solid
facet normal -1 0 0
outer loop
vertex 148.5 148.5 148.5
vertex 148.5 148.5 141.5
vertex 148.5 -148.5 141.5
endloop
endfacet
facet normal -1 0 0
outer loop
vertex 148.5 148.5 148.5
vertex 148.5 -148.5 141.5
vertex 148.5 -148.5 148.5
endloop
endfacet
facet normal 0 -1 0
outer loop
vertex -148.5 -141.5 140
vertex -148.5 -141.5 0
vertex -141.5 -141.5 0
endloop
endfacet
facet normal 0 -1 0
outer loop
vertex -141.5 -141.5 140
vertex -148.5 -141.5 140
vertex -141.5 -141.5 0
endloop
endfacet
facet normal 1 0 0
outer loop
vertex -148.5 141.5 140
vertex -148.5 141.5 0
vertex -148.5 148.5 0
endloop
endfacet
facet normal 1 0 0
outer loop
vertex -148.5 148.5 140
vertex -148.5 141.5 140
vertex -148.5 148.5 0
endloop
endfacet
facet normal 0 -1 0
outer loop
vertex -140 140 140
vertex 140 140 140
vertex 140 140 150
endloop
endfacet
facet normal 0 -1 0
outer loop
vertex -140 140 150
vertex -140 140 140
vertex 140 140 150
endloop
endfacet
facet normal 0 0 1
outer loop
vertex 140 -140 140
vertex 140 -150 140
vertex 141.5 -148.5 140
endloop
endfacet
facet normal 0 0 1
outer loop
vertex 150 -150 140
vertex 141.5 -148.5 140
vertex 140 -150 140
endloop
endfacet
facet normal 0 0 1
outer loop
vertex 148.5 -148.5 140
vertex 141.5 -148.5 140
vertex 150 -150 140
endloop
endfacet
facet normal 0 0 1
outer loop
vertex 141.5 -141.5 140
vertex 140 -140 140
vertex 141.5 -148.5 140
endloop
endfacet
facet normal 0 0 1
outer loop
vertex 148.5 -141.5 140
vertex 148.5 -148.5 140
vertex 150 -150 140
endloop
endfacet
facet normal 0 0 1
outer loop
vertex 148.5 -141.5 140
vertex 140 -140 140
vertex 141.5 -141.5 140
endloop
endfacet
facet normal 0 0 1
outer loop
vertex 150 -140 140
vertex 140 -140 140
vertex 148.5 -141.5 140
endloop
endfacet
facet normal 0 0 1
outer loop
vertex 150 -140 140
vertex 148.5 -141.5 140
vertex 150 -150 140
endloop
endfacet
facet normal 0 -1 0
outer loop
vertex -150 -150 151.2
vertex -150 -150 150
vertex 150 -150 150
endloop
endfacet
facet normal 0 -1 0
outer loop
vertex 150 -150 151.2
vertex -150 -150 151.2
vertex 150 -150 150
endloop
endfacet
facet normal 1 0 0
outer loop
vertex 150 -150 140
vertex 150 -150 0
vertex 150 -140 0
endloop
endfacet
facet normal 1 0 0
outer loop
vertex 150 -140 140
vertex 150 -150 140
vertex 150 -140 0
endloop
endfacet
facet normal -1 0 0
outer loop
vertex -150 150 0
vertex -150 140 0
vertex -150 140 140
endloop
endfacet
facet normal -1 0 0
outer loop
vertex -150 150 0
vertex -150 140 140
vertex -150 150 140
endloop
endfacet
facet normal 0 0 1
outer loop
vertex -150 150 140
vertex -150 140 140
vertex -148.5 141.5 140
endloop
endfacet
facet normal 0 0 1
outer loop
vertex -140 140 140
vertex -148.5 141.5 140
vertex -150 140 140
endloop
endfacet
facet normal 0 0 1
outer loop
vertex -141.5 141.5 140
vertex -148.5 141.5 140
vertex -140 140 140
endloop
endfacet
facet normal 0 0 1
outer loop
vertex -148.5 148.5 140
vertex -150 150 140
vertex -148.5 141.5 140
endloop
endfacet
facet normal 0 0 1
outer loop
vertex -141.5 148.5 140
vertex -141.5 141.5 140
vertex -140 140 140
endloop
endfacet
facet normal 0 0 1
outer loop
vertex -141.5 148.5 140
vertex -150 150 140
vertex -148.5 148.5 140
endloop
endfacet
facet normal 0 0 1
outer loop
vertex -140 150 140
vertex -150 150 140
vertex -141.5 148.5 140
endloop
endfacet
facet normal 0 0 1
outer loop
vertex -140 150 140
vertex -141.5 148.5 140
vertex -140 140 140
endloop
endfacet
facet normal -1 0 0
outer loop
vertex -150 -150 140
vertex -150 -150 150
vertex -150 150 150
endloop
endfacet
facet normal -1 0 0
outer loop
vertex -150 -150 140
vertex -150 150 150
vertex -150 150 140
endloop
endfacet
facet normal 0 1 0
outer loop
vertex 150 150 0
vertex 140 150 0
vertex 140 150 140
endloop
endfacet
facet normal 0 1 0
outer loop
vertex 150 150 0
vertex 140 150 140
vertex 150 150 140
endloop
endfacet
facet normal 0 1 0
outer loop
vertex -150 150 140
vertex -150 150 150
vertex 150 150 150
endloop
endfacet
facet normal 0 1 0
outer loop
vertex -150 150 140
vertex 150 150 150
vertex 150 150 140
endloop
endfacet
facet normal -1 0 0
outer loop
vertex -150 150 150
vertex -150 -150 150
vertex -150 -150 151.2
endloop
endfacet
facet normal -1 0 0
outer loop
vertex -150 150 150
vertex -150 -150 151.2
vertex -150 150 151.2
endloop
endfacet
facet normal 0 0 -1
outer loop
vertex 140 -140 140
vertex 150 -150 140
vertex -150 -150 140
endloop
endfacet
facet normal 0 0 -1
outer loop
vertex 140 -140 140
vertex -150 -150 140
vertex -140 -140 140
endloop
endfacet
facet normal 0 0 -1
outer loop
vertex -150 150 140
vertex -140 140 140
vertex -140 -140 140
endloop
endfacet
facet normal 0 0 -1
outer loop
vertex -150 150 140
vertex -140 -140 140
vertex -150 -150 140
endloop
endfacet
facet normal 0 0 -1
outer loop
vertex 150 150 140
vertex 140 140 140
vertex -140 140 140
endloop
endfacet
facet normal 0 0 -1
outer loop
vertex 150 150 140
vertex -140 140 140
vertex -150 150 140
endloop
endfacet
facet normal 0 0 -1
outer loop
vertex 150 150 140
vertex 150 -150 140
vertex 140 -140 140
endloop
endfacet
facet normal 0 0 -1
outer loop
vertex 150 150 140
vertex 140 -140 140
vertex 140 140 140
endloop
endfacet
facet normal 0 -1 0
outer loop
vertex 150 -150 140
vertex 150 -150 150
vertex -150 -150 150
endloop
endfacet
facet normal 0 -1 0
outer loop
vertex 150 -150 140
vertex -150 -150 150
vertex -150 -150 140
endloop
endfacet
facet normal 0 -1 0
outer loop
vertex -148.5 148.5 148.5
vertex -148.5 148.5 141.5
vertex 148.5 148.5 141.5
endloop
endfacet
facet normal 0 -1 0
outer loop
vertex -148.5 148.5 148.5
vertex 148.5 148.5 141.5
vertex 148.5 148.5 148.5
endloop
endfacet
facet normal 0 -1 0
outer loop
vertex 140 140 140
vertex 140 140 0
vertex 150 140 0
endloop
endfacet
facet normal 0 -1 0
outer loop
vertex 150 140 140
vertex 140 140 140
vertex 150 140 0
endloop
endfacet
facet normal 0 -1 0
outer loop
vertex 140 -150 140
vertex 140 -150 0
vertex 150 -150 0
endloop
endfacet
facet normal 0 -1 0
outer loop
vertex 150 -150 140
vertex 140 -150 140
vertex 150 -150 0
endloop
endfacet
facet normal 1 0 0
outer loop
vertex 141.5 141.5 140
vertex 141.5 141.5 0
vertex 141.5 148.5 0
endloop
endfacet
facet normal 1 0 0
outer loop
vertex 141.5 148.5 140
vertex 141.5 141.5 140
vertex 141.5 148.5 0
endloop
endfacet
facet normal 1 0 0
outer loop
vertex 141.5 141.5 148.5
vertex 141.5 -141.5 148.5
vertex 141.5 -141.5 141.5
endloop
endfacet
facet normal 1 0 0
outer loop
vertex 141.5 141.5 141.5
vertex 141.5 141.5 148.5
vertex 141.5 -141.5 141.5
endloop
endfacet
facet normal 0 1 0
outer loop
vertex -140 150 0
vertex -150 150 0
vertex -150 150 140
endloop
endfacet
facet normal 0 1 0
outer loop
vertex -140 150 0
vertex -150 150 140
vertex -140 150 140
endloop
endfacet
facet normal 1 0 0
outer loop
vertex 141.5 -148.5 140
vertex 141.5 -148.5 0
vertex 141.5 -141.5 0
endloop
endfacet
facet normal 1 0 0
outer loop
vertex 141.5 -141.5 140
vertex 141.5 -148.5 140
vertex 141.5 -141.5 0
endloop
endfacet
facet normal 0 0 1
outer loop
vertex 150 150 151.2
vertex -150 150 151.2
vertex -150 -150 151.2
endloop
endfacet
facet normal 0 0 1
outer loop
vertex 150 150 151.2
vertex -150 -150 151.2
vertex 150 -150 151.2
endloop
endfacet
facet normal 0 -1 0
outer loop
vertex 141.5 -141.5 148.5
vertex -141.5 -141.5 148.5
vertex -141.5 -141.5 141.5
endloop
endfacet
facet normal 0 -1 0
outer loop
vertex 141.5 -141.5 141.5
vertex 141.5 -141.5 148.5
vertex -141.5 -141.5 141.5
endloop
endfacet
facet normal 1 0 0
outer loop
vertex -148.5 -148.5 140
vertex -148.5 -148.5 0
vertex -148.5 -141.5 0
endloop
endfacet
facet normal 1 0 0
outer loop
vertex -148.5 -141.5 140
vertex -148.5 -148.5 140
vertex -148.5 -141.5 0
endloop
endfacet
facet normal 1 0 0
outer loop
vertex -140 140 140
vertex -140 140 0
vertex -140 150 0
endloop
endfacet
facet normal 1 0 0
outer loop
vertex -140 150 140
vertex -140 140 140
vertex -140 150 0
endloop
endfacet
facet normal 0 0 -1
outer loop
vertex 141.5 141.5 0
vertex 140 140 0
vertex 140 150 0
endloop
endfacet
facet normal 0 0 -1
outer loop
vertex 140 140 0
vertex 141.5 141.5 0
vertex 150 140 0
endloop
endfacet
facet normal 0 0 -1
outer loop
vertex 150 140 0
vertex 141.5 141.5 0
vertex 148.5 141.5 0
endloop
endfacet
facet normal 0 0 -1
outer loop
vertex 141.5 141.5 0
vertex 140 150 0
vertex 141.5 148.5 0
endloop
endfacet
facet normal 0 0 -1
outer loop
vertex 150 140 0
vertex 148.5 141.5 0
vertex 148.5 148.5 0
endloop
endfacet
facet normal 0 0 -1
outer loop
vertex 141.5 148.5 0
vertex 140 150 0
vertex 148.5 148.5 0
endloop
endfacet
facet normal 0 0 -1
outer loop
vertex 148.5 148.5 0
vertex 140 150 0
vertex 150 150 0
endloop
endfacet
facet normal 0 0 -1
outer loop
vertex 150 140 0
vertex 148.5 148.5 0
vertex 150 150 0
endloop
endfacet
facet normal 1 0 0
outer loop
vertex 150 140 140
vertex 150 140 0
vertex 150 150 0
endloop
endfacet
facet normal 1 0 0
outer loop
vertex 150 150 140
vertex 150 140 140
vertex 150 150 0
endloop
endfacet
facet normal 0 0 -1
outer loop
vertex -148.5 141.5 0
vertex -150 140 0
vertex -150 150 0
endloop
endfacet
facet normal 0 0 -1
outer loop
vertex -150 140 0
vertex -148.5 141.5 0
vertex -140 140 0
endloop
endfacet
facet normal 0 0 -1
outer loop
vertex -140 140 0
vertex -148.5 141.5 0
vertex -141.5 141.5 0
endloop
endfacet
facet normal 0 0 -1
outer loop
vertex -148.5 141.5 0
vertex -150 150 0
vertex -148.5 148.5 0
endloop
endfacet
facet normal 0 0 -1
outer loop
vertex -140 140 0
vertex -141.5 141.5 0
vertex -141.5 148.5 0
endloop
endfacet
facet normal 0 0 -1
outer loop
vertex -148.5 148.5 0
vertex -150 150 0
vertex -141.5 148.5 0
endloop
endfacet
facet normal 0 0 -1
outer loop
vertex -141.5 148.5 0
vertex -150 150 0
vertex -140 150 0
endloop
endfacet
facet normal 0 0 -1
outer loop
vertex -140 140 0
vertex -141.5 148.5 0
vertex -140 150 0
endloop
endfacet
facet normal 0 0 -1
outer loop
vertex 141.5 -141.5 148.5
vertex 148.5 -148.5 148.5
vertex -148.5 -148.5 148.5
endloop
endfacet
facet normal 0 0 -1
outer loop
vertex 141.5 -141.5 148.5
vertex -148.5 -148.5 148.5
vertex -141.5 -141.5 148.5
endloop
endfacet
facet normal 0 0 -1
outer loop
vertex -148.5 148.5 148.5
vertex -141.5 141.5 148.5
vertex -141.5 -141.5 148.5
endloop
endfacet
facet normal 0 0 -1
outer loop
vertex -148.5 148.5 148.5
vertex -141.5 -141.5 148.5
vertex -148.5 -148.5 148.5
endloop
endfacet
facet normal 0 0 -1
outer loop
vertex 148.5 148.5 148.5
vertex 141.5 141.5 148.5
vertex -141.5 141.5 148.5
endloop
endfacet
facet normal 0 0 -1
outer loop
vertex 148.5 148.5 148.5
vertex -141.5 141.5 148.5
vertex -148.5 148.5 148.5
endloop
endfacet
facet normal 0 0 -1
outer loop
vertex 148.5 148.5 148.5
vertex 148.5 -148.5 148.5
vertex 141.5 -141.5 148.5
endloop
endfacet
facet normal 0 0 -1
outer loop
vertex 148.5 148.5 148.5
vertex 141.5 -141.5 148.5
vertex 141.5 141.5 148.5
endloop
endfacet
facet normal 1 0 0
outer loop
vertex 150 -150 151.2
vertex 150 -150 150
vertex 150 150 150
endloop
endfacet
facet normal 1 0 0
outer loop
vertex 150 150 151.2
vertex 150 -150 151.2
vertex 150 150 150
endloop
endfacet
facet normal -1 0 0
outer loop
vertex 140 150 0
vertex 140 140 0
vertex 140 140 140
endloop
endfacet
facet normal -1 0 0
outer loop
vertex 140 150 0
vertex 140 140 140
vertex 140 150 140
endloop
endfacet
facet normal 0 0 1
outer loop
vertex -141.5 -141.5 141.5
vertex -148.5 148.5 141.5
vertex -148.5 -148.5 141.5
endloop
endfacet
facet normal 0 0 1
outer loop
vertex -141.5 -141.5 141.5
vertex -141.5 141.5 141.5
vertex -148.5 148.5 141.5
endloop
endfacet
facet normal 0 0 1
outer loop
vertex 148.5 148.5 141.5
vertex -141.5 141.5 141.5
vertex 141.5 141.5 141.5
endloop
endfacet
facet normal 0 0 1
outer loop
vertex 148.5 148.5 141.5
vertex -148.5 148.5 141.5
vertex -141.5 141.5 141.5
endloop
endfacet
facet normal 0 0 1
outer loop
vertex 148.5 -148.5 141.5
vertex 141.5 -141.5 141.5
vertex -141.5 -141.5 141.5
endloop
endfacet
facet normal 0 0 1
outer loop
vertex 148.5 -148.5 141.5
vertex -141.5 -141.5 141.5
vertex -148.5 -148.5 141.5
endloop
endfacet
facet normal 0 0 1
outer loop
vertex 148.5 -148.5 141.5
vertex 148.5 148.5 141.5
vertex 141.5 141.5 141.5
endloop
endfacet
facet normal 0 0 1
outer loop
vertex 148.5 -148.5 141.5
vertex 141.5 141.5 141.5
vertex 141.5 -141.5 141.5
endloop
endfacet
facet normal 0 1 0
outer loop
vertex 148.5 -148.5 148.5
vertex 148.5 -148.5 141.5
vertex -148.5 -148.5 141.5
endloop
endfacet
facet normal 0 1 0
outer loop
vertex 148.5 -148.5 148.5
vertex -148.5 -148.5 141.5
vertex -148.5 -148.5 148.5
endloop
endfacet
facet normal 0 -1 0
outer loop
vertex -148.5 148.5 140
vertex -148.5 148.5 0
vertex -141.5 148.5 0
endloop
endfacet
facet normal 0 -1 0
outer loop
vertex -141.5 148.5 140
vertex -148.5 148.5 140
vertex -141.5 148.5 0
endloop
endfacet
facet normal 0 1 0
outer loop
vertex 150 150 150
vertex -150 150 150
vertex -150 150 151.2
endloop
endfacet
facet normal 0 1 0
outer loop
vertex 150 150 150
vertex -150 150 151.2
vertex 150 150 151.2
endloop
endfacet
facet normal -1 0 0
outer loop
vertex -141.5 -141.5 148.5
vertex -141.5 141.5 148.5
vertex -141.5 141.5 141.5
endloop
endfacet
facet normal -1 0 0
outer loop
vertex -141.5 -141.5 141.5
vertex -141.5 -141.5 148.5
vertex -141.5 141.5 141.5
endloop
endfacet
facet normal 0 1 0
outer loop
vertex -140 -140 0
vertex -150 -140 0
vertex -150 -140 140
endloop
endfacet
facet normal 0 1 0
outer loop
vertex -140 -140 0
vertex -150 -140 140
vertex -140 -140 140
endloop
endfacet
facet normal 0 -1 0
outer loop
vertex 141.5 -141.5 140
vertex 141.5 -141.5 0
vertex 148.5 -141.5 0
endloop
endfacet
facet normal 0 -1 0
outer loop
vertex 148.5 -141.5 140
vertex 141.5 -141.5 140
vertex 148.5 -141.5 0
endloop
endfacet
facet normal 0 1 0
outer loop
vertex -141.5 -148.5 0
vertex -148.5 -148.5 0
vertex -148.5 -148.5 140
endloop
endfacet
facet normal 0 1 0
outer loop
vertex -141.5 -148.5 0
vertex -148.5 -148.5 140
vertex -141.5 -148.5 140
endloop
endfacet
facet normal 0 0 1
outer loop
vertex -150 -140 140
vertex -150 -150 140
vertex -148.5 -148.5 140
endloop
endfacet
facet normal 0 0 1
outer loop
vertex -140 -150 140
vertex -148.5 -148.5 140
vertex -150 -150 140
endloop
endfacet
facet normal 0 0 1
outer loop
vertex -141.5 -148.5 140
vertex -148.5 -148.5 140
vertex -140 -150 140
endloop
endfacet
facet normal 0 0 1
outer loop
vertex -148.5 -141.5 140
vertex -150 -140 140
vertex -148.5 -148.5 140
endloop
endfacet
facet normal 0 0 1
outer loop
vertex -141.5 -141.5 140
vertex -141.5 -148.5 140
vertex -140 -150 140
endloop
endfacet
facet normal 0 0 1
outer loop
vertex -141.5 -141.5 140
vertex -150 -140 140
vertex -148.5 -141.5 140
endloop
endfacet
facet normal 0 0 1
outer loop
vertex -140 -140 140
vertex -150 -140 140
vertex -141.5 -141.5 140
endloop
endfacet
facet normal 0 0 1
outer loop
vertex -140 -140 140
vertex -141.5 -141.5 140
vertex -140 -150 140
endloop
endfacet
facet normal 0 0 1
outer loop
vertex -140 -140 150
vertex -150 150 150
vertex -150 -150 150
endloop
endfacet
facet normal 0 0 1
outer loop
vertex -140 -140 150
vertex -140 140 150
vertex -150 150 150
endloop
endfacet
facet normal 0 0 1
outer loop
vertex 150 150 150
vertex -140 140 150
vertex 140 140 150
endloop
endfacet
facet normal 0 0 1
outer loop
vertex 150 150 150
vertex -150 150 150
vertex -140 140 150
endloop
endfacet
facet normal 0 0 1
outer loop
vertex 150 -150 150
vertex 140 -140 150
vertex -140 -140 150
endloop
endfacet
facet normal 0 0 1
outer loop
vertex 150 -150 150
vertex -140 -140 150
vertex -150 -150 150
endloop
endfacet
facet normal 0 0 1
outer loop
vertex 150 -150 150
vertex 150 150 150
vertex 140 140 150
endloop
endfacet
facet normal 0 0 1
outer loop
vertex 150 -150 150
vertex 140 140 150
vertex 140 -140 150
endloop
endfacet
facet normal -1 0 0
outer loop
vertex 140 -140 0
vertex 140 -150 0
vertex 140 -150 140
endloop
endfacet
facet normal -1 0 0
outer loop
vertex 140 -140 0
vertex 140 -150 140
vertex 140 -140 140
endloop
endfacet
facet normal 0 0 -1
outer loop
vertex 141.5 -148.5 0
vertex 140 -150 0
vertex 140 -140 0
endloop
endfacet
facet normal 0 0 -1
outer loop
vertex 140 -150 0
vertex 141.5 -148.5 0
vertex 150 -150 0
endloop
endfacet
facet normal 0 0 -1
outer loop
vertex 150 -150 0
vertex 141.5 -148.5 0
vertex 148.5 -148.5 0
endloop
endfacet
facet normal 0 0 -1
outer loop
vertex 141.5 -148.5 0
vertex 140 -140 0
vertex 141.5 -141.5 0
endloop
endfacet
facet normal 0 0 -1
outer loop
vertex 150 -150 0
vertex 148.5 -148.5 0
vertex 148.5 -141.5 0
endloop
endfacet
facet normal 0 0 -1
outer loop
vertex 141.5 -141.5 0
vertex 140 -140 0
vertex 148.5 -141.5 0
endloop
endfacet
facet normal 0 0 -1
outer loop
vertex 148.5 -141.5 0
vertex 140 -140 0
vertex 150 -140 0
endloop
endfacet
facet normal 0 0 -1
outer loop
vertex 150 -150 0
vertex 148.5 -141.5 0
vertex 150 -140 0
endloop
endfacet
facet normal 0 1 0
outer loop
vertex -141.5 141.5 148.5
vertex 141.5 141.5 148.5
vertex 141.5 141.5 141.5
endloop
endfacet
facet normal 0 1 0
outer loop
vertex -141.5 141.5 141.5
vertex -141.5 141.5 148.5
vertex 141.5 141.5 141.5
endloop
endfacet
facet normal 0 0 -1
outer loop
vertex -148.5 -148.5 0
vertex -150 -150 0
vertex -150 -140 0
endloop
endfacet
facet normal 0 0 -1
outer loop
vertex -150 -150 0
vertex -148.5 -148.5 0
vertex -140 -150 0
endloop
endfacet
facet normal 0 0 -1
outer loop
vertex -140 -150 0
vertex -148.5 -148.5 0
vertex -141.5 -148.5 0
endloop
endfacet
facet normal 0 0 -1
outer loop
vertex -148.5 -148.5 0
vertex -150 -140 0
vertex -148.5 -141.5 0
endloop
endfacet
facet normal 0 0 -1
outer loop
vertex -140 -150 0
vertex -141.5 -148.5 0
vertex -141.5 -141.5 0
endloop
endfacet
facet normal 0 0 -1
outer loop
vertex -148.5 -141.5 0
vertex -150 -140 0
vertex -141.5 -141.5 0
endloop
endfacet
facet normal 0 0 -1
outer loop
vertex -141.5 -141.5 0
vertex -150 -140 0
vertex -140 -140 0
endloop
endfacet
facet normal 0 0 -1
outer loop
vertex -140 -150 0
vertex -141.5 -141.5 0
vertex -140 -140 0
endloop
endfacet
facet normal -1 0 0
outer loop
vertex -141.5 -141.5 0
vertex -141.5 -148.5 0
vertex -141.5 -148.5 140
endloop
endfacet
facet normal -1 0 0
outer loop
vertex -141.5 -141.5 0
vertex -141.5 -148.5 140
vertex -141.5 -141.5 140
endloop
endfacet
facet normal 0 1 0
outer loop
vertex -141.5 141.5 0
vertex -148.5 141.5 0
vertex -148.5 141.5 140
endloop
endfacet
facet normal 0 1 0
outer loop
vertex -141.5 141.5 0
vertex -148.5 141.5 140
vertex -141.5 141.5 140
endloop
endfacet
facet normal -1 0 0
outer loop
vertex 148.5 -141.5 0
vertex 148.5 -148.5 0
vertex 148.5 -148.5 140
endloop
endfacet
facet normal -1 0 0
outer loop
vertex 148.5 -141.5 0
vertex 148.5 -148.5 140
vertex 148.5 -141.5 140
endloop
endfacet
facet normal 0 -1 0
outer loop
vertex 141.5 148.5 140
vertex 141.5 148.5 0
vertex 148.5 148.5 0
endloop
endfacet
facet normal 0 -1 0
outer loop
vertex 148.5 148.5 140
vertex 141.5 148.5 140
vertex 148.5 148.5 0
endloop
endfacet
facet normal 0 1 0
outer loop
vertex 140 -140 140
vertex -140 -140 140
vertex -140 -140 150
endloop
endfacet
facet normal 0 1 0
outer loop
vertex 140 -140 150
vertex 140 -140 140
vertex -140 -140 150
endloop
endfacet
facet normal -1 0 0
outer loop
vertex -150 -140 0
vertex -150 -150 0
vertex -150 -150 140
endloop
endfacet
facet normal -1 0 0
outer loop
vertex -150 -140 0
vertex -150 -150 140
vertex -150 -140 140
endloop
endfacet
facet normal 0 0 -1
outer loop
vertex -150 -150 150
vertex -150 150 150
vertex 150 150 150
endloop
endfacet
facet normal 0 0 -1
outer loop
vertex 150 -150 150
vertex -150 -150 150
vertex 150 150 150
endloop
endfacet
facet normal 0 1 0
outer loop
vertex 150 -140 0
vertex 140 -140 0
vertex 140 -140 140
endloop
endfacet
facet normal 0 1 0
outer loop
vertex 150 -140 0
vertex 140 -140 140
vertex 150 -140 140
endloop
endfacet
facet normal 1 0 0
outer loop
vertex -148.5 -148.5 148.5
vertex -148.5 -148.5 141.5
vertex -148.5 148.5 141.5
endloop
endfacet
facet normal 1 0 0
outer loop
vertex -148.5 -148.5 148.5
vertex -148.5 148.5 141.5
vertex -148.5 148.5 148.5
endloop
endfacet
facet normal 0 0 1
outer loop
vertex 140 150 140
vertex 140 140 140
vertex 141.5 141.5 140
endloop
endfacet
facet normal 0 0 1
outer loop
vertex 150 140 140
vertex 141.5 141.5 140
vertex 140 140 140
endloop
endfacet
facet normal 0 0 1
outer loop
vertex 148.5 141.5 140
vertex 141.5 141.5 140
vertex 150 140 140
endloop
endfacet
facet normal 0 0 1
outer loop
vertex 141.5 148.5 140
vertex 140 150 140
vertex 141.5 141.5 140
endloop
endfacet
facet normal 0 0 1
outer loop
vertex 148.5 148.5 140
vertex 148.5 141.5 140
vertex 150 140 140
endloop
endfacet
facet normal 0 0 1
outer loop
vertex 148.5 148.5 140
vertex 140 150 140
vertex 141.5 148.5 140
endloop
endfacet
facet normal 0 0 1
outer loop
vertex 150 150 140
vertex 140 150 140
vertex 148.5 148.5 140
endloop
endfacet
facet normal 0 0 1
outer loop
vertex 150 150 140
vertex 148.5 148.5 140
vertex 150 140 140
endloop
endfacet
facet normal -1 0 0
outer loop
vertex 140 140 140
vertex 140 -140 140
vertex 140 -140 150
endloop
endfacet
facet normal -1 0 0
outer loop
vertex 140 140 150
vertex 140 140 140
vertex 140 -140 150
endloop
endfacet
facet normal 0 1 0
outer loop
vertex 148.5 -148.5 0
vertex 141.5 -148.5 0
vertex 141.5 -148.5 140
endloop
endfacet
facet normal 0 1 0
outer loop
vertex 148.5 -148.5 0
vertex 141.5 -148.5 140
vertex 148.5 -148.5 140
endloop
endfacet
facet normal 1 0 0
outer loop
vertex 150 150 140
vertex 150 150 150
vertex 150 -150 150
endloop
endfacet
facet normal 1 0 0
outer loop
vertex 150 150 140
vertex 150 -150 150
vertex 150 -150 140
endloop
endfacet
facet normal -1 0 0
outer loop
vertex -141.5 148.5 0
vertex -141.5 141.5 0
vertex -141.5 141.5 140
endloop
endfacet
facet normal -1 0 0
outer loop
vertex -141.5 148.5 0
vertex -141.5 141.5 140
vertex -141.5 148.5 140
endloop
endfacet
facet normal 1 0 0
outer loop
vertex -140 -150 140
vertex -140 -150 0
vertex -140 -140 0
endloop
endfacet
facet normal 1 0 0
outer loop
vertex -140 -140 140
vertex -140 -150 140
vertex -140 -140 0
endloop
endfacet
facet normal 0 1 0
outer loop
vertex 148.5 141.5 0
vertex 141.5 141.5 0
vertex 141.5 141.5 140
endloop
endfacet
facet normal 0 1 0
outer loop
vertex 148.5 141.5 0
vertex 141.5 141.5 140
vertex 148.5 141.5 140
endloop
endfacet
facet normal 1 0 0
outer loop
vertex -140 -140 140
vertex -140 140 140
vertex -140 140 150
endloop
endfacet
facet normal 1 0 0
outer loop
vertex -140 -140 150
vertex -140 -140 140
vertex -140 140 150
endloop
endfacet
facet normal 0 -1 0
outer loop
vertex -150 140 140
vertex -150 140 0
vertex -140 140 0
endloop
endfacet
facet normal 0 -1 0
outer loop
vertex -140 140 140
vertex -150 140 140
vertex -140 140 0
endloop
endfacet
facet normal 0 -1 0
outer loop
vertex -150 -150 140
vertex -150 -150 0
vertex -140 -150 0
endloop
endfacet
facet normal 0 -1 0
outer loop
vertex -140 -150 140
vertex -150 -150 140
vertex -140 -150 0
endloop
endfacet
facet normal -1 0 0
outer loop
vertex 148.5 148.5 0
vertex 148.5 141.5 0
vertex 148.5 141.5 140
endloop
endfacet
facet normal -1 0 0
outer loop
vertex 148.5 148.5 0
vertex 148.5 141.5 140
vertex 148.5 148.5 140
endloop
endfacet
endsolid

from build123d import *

# Parameters (mm, degrees)
F0_W     = 10
F0_H     = 10
F0_W_2   = 7
F0_H_2   = 7
F1_DEPTH = 140
F3_W     = 10
F3_H     = 10
F3_W_2   = 7
F3_H_2   = 7
F5_W     = 300
F5_H     = 300
F6_DEPTH = 1.2


with BuildPart() as f1:
    # F0 (on Top) → F1 (new body)
    with BuildSketch(Plane.XY):
        with Locations((-145, 145)):
            Rectangle(F0_W, F0_H)
        with Locations((-145, 145)):
            Rectangle(F0_W_2, F0_H_2, mode=Mode.SUBTRACT)
    extrude(amount=F1_DEPTH)


with BuildPart() as f1b:
    # F0 (on Top) → F1, piece 2 (new body)
    with BuildSketch(Plane.XY):
        with Locations((145, 145)):
            Rectangle(F0_W, F0_H)
        with Locations((145, 145)):
            Rectangle(F0_W_2, F0_H_2, mode=Mode.SUBTRACT)
    extrude(amount=F1_DEPTH)


with BuildPart() as f1c:
    # F0 (on Top) → F1, piece 3 (new body)
    with BuildSketch(Plane.XY):
        with Locations((145, -145)):
            Rectangle(F0_W, F0_H)
        with Locations((145, -145)):
            Rectangle(F0_W_2, F0_H_2, mode=Mode.SUBTRACT)
    extrude(amount=F1_DEPTH)


with BuildPart() as f1d:
    # F0 (on Top) → F1, piece 4 (new body)
    with BuildSketch(Plane.XY):
        with Locations((-145, -145)):
            Rectangle(F0_W, F0_H)
        with Locations((-145, -145)):
            Rectangle(F0_W_2, F0_H_2, mode=Mode.SUBTRACT)
    extrude(amount=F1_DEPTH)


with BuildPart() as f4:
    # F4: sweep along a path in F2
    with BuildLine(Plane.XY.offset(140)) as f4_path:
        Line((-150, -150), (150, -150))
        Line((150, -150), (150, 150))
        Line((150, 150), (-150, 150))
        Line((-150, 150), (-150, -150))
    # F3 (on Right) → F4 (sweep)
    with BuildSketch(Plane.YZ):
        with Locations((-145, 145)):
            Rectangle(F3_W, F3_H)
        with Locations((-145, 145)):
            Rectangle(F3_W_2, F3_H_2, mode=Mode.SUBTRACT)
    sweep(path=f4_path.line, transition=Transition.RIGHT)


with BuildPart() as f6:
    # F5 (on face) → F6 (new body)
    with BuildSketch(Plane.XY.offset(150)):
        Rectangle(F5_W, F5_H)
    extrude(amount=F6_DEPTH)


solid = Compound([f1.part, f1b.part, f1c.part, f1d.part, f4.part, f6.part])
